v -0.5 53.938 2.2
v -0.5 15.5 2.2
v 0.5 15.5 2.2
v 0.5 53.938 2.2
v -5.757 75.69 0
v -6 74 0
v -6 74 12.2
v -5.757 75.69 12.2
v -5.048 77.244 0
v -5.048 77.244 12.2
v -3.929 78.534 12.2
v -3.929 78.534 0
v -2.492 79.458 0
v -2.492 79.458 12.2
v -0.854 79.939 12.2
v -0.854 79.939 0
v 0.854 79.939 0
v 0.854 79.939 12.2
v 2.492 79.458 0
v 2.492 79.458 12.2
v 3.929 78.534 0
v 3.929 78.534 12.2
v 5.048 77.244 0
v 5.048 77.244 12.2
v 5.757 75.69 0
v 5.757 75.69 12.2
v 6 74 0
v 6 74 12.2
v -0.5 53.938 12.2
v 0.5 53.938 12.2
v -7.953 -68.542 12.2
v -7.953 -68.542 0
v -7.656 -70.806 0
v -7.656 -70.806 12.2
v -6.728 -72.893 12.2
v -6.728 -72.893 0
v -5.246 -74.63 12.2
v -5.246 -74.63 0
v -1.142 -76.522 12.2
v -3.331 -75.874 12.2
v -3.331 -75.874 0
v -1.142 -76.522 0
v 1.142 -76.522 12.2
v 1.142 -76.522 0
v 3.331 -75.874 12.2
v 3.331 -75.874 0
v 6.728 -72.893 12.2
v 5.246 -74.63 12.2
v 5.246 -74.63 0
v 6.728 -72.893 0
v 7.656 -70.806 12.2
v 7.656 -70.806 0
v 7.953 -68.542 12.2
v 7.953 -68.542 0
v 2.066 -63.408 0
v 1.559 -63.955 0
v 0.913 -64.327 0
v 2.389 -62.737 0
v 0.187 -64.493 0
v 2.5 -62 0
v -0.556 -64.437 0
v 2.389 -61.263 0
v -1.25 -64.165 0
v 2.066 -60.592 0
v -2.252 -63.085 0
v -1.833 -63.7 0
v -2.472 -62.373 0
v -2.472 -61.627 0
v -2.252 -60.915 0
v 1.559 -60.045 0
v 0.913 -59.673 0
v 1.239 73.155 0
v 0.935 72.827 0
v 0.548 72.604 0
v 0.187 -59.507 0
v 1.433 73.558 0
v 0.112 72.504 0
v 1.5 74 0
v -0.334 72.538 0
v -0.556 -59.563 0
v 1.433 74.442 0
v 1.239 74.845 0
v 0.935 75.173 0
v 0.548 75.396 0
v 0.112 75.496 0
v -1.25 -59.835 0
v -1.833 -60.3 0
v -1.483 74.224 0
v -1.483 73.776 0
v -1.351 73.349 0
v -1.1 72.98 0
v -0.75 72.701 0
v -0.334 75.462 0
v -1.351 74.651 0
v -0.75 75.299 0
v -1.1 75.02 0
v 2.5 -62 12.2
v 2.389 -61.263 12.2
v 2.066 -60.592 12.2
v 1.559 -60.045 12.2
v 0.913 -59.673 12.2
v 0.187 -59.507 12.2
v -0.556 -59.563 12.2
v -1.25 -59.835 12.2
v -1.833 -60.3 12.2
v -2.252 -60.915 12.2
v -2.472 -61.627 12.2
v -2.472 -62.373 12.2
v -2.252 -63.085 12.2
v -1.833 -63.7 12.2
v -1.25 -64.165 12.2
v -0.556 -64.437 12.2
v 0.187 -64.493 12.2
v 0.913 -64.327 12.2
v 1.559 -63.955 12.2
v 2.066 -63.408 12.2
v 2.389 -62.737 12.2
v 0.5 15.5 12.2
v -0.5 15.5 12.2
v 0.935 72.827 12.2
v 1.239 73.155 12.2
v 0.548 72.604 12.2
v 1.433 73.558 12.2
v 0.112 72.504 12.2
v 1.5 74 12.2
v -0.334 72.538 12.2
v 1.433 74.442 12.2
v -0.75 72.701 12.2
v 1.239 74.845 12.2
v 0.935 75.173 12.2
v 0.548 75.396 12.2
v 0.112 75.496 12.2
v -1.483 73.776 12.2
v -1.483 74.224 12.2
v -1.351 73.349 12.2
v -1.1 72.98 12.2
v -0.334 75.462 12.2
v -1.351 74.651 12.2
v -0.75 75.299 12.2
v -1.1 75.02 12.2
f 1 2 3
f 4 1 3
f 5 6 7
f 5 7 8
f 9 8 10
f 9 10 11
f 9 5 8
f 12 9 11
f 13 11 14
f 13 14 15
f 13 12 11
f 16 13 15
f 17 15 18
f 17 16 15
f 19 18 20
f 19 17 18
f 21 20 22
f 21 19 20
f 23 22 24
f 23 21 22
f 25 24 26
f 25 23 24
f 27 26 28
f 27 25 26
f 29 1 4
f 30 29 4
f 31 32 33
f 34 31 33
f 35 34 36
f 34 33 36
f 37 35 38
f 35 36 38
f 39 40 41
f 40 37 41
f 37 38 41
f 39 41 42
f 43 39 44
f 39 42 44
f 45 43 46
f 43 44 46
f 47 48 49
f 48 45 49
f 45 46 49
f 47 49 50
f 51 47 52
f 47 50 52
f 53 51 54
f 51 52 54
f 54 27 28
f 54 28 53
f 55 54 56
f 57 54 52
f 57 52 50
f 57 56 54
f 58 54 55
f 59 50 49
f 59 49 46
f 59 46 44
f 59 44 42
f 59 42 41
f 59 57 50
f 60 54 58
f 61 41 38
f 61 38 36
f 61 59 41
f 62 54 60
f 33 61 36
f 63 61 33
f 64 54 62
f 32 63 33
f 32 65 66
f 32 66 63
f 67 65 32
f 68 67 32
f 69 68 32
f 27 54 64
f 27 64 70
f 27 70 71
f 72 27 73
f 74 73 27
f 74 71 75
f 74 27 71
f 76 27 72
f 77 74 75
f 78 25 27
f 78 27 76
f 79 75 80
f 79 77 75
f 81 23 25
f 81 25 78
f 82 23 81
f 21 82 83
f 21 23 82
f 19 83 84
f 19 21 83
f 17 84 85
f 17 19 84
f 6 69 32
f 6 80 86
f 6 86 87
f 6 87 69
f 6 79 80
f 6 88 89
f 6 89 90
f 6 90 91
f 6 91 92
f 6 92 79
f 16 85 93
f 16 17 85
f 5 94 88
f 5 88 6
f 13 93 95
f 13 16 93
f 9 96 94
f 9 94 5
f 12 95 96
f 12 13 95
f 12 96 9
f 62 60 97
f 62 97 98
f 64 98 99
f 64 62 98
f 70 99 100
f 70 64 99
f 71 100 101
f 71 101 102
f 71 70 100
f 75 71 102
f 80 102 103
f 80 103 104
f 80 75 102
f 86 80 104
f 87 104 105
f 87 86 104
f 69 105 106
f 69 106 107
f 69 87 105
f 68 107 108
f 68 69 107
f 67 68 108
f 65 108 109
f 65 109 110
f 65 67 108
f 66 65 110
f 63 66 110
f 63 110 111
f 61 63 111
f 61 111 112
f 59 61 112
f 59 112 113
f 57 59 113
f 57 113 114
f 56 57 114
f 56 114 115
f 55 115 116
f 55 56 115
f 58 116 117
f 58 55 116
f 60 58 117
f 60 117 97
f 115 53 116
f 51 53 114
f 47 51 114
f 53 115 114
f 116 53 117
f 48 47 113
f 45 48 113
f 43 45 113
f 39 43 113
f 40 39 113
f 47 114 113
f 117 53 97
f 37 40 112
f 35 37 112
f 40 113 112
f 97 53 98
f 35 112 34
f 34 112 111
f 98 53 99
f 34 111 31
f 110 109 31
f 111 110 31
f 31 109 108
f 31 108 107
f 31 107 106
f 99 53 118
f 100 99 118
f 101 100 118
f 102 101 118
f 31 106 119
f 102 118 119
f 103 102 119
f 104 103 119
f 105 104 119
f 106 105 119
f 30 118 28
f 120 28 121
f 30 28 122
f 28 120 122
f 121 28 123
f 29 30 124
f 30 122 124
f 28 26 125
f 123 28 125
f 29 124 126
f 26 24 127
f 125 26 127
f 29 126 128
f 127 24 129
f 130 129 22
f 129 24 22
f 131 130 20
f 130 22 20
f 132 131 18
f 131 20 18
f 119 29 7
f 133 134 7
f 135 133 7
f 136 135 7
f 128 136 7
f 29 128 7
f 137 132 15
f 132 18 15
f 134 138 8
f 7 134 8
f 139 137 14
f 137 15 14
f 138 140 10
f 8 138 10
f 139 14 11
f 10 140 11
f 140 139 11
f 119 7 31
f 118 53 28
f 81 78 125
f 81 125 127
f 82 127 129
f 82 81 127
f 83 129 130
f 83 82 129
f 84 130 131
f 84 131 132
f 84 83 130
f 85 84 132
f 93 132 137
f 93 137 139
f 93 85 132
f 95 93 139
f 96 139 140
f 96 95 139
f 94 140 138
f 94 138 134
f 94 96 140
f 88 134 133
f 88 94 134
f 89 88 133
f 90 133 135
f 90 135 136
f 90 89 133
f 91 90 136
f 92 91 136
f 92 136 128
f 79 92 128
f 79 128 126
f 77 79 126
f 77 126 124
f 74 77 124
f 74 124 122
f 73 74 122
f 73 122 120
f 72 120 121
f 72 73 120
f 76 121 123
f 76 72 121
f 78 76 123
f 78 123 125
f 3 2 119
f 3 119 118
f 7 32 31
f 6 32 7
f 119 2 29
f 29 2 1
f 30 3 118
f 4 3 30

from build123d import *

# Parameters (mm, degrees)
SKETCH2_R                    = 1.5
SKETCH2_R_2                  = 2.5
BOSS_EXTRUDE1_DEPTH          = 12.2
CUT_EXTRUDE_THIN2_DEPTH      = 82.319370386
CUT_EXTRUDE_THIN2_DEPTH_BACK = 60
CUT_EXTRUDE_THIN3_DEPTH      = 82.314797438
CUT_EXTRUDE_THIN3_DEPTH_BACK = 10
SKETCH4_W                    = 1
SKETCH4_H                    = 38.438218158


with BuildPart() as part:
    # Sketch2 → Boss-Extrude1 (new body)
    with BuildSketch(Plane.XY):
        with BuildLine():
            Line((-8, -72), (-6, 74))
            ThreePointArc((-6, 74), (0, 80), (6, 74))
            Line((6, 74), (8, -72))
            ThreePointArc((8, -72), (0, -80), (-8, -72))
        make_face()
        with Locations((0, 74)):
            Circle(SKETCH2_R, mode=Mode.SUBTRACT)
        with Locations((0, -62)):
            Circle(SKETCH2_R_2, mode=Mode.SUBTRACT)
    extrude(amount=BOSS_EXTRUDE1_DEPTH)

    # Sketch3 → Cut-Extrude-Thin2 (cut, two sides: drawn at the far end of the back side and taken through both)
    with BuildSketch(Plane.XY.offset(12.2).offset(-CUT_EXTRUDE_THIN2_DEPTH_BACK)):
        with BuildLine():
            ThreePointArc((-7.952635689, -68.542405266), (0, -76.6047273), (7.952635689, -68.542405266))
            Line((7.952635689, -68.542405266), (17.951697558, -68.405431815))
            ThreePointArc((17.951697558, -68.405431815), (0, -86.6047273), (-17.951697558, -68.405431815))
            Line((-17.951697558, -68.405431815), (-7.952635689, -68.542405266))
        make_face()
    extrude(amount=CUT_EXTRUDE_THIN2_DEPTH + CUT_EXTRUDE_THIN2_DEPTH_BACK, mode=Mode.SUBTRACT)

    # Sketch4 → Cut-Extrude-Thin3 (cut, two sides: drawn at the far end of the back side and taken through both)
    with BuildSketch(Plane.XY.offset(12.2).offset(-CUT_EXTRUDE_THIN3_DEPTH_BACK)):
        with Locations((0, 34.719285659)):
            Rectangle(SKETCH4_W, SKETCH4_H)
    extrude(amount=CUT_EXTRUDE_THIN3_DEPTH + CUT_EXTRUDE_THIN3_DEPTH_BACK, mode=Mode.SUBTRACT)


solid = part.part
